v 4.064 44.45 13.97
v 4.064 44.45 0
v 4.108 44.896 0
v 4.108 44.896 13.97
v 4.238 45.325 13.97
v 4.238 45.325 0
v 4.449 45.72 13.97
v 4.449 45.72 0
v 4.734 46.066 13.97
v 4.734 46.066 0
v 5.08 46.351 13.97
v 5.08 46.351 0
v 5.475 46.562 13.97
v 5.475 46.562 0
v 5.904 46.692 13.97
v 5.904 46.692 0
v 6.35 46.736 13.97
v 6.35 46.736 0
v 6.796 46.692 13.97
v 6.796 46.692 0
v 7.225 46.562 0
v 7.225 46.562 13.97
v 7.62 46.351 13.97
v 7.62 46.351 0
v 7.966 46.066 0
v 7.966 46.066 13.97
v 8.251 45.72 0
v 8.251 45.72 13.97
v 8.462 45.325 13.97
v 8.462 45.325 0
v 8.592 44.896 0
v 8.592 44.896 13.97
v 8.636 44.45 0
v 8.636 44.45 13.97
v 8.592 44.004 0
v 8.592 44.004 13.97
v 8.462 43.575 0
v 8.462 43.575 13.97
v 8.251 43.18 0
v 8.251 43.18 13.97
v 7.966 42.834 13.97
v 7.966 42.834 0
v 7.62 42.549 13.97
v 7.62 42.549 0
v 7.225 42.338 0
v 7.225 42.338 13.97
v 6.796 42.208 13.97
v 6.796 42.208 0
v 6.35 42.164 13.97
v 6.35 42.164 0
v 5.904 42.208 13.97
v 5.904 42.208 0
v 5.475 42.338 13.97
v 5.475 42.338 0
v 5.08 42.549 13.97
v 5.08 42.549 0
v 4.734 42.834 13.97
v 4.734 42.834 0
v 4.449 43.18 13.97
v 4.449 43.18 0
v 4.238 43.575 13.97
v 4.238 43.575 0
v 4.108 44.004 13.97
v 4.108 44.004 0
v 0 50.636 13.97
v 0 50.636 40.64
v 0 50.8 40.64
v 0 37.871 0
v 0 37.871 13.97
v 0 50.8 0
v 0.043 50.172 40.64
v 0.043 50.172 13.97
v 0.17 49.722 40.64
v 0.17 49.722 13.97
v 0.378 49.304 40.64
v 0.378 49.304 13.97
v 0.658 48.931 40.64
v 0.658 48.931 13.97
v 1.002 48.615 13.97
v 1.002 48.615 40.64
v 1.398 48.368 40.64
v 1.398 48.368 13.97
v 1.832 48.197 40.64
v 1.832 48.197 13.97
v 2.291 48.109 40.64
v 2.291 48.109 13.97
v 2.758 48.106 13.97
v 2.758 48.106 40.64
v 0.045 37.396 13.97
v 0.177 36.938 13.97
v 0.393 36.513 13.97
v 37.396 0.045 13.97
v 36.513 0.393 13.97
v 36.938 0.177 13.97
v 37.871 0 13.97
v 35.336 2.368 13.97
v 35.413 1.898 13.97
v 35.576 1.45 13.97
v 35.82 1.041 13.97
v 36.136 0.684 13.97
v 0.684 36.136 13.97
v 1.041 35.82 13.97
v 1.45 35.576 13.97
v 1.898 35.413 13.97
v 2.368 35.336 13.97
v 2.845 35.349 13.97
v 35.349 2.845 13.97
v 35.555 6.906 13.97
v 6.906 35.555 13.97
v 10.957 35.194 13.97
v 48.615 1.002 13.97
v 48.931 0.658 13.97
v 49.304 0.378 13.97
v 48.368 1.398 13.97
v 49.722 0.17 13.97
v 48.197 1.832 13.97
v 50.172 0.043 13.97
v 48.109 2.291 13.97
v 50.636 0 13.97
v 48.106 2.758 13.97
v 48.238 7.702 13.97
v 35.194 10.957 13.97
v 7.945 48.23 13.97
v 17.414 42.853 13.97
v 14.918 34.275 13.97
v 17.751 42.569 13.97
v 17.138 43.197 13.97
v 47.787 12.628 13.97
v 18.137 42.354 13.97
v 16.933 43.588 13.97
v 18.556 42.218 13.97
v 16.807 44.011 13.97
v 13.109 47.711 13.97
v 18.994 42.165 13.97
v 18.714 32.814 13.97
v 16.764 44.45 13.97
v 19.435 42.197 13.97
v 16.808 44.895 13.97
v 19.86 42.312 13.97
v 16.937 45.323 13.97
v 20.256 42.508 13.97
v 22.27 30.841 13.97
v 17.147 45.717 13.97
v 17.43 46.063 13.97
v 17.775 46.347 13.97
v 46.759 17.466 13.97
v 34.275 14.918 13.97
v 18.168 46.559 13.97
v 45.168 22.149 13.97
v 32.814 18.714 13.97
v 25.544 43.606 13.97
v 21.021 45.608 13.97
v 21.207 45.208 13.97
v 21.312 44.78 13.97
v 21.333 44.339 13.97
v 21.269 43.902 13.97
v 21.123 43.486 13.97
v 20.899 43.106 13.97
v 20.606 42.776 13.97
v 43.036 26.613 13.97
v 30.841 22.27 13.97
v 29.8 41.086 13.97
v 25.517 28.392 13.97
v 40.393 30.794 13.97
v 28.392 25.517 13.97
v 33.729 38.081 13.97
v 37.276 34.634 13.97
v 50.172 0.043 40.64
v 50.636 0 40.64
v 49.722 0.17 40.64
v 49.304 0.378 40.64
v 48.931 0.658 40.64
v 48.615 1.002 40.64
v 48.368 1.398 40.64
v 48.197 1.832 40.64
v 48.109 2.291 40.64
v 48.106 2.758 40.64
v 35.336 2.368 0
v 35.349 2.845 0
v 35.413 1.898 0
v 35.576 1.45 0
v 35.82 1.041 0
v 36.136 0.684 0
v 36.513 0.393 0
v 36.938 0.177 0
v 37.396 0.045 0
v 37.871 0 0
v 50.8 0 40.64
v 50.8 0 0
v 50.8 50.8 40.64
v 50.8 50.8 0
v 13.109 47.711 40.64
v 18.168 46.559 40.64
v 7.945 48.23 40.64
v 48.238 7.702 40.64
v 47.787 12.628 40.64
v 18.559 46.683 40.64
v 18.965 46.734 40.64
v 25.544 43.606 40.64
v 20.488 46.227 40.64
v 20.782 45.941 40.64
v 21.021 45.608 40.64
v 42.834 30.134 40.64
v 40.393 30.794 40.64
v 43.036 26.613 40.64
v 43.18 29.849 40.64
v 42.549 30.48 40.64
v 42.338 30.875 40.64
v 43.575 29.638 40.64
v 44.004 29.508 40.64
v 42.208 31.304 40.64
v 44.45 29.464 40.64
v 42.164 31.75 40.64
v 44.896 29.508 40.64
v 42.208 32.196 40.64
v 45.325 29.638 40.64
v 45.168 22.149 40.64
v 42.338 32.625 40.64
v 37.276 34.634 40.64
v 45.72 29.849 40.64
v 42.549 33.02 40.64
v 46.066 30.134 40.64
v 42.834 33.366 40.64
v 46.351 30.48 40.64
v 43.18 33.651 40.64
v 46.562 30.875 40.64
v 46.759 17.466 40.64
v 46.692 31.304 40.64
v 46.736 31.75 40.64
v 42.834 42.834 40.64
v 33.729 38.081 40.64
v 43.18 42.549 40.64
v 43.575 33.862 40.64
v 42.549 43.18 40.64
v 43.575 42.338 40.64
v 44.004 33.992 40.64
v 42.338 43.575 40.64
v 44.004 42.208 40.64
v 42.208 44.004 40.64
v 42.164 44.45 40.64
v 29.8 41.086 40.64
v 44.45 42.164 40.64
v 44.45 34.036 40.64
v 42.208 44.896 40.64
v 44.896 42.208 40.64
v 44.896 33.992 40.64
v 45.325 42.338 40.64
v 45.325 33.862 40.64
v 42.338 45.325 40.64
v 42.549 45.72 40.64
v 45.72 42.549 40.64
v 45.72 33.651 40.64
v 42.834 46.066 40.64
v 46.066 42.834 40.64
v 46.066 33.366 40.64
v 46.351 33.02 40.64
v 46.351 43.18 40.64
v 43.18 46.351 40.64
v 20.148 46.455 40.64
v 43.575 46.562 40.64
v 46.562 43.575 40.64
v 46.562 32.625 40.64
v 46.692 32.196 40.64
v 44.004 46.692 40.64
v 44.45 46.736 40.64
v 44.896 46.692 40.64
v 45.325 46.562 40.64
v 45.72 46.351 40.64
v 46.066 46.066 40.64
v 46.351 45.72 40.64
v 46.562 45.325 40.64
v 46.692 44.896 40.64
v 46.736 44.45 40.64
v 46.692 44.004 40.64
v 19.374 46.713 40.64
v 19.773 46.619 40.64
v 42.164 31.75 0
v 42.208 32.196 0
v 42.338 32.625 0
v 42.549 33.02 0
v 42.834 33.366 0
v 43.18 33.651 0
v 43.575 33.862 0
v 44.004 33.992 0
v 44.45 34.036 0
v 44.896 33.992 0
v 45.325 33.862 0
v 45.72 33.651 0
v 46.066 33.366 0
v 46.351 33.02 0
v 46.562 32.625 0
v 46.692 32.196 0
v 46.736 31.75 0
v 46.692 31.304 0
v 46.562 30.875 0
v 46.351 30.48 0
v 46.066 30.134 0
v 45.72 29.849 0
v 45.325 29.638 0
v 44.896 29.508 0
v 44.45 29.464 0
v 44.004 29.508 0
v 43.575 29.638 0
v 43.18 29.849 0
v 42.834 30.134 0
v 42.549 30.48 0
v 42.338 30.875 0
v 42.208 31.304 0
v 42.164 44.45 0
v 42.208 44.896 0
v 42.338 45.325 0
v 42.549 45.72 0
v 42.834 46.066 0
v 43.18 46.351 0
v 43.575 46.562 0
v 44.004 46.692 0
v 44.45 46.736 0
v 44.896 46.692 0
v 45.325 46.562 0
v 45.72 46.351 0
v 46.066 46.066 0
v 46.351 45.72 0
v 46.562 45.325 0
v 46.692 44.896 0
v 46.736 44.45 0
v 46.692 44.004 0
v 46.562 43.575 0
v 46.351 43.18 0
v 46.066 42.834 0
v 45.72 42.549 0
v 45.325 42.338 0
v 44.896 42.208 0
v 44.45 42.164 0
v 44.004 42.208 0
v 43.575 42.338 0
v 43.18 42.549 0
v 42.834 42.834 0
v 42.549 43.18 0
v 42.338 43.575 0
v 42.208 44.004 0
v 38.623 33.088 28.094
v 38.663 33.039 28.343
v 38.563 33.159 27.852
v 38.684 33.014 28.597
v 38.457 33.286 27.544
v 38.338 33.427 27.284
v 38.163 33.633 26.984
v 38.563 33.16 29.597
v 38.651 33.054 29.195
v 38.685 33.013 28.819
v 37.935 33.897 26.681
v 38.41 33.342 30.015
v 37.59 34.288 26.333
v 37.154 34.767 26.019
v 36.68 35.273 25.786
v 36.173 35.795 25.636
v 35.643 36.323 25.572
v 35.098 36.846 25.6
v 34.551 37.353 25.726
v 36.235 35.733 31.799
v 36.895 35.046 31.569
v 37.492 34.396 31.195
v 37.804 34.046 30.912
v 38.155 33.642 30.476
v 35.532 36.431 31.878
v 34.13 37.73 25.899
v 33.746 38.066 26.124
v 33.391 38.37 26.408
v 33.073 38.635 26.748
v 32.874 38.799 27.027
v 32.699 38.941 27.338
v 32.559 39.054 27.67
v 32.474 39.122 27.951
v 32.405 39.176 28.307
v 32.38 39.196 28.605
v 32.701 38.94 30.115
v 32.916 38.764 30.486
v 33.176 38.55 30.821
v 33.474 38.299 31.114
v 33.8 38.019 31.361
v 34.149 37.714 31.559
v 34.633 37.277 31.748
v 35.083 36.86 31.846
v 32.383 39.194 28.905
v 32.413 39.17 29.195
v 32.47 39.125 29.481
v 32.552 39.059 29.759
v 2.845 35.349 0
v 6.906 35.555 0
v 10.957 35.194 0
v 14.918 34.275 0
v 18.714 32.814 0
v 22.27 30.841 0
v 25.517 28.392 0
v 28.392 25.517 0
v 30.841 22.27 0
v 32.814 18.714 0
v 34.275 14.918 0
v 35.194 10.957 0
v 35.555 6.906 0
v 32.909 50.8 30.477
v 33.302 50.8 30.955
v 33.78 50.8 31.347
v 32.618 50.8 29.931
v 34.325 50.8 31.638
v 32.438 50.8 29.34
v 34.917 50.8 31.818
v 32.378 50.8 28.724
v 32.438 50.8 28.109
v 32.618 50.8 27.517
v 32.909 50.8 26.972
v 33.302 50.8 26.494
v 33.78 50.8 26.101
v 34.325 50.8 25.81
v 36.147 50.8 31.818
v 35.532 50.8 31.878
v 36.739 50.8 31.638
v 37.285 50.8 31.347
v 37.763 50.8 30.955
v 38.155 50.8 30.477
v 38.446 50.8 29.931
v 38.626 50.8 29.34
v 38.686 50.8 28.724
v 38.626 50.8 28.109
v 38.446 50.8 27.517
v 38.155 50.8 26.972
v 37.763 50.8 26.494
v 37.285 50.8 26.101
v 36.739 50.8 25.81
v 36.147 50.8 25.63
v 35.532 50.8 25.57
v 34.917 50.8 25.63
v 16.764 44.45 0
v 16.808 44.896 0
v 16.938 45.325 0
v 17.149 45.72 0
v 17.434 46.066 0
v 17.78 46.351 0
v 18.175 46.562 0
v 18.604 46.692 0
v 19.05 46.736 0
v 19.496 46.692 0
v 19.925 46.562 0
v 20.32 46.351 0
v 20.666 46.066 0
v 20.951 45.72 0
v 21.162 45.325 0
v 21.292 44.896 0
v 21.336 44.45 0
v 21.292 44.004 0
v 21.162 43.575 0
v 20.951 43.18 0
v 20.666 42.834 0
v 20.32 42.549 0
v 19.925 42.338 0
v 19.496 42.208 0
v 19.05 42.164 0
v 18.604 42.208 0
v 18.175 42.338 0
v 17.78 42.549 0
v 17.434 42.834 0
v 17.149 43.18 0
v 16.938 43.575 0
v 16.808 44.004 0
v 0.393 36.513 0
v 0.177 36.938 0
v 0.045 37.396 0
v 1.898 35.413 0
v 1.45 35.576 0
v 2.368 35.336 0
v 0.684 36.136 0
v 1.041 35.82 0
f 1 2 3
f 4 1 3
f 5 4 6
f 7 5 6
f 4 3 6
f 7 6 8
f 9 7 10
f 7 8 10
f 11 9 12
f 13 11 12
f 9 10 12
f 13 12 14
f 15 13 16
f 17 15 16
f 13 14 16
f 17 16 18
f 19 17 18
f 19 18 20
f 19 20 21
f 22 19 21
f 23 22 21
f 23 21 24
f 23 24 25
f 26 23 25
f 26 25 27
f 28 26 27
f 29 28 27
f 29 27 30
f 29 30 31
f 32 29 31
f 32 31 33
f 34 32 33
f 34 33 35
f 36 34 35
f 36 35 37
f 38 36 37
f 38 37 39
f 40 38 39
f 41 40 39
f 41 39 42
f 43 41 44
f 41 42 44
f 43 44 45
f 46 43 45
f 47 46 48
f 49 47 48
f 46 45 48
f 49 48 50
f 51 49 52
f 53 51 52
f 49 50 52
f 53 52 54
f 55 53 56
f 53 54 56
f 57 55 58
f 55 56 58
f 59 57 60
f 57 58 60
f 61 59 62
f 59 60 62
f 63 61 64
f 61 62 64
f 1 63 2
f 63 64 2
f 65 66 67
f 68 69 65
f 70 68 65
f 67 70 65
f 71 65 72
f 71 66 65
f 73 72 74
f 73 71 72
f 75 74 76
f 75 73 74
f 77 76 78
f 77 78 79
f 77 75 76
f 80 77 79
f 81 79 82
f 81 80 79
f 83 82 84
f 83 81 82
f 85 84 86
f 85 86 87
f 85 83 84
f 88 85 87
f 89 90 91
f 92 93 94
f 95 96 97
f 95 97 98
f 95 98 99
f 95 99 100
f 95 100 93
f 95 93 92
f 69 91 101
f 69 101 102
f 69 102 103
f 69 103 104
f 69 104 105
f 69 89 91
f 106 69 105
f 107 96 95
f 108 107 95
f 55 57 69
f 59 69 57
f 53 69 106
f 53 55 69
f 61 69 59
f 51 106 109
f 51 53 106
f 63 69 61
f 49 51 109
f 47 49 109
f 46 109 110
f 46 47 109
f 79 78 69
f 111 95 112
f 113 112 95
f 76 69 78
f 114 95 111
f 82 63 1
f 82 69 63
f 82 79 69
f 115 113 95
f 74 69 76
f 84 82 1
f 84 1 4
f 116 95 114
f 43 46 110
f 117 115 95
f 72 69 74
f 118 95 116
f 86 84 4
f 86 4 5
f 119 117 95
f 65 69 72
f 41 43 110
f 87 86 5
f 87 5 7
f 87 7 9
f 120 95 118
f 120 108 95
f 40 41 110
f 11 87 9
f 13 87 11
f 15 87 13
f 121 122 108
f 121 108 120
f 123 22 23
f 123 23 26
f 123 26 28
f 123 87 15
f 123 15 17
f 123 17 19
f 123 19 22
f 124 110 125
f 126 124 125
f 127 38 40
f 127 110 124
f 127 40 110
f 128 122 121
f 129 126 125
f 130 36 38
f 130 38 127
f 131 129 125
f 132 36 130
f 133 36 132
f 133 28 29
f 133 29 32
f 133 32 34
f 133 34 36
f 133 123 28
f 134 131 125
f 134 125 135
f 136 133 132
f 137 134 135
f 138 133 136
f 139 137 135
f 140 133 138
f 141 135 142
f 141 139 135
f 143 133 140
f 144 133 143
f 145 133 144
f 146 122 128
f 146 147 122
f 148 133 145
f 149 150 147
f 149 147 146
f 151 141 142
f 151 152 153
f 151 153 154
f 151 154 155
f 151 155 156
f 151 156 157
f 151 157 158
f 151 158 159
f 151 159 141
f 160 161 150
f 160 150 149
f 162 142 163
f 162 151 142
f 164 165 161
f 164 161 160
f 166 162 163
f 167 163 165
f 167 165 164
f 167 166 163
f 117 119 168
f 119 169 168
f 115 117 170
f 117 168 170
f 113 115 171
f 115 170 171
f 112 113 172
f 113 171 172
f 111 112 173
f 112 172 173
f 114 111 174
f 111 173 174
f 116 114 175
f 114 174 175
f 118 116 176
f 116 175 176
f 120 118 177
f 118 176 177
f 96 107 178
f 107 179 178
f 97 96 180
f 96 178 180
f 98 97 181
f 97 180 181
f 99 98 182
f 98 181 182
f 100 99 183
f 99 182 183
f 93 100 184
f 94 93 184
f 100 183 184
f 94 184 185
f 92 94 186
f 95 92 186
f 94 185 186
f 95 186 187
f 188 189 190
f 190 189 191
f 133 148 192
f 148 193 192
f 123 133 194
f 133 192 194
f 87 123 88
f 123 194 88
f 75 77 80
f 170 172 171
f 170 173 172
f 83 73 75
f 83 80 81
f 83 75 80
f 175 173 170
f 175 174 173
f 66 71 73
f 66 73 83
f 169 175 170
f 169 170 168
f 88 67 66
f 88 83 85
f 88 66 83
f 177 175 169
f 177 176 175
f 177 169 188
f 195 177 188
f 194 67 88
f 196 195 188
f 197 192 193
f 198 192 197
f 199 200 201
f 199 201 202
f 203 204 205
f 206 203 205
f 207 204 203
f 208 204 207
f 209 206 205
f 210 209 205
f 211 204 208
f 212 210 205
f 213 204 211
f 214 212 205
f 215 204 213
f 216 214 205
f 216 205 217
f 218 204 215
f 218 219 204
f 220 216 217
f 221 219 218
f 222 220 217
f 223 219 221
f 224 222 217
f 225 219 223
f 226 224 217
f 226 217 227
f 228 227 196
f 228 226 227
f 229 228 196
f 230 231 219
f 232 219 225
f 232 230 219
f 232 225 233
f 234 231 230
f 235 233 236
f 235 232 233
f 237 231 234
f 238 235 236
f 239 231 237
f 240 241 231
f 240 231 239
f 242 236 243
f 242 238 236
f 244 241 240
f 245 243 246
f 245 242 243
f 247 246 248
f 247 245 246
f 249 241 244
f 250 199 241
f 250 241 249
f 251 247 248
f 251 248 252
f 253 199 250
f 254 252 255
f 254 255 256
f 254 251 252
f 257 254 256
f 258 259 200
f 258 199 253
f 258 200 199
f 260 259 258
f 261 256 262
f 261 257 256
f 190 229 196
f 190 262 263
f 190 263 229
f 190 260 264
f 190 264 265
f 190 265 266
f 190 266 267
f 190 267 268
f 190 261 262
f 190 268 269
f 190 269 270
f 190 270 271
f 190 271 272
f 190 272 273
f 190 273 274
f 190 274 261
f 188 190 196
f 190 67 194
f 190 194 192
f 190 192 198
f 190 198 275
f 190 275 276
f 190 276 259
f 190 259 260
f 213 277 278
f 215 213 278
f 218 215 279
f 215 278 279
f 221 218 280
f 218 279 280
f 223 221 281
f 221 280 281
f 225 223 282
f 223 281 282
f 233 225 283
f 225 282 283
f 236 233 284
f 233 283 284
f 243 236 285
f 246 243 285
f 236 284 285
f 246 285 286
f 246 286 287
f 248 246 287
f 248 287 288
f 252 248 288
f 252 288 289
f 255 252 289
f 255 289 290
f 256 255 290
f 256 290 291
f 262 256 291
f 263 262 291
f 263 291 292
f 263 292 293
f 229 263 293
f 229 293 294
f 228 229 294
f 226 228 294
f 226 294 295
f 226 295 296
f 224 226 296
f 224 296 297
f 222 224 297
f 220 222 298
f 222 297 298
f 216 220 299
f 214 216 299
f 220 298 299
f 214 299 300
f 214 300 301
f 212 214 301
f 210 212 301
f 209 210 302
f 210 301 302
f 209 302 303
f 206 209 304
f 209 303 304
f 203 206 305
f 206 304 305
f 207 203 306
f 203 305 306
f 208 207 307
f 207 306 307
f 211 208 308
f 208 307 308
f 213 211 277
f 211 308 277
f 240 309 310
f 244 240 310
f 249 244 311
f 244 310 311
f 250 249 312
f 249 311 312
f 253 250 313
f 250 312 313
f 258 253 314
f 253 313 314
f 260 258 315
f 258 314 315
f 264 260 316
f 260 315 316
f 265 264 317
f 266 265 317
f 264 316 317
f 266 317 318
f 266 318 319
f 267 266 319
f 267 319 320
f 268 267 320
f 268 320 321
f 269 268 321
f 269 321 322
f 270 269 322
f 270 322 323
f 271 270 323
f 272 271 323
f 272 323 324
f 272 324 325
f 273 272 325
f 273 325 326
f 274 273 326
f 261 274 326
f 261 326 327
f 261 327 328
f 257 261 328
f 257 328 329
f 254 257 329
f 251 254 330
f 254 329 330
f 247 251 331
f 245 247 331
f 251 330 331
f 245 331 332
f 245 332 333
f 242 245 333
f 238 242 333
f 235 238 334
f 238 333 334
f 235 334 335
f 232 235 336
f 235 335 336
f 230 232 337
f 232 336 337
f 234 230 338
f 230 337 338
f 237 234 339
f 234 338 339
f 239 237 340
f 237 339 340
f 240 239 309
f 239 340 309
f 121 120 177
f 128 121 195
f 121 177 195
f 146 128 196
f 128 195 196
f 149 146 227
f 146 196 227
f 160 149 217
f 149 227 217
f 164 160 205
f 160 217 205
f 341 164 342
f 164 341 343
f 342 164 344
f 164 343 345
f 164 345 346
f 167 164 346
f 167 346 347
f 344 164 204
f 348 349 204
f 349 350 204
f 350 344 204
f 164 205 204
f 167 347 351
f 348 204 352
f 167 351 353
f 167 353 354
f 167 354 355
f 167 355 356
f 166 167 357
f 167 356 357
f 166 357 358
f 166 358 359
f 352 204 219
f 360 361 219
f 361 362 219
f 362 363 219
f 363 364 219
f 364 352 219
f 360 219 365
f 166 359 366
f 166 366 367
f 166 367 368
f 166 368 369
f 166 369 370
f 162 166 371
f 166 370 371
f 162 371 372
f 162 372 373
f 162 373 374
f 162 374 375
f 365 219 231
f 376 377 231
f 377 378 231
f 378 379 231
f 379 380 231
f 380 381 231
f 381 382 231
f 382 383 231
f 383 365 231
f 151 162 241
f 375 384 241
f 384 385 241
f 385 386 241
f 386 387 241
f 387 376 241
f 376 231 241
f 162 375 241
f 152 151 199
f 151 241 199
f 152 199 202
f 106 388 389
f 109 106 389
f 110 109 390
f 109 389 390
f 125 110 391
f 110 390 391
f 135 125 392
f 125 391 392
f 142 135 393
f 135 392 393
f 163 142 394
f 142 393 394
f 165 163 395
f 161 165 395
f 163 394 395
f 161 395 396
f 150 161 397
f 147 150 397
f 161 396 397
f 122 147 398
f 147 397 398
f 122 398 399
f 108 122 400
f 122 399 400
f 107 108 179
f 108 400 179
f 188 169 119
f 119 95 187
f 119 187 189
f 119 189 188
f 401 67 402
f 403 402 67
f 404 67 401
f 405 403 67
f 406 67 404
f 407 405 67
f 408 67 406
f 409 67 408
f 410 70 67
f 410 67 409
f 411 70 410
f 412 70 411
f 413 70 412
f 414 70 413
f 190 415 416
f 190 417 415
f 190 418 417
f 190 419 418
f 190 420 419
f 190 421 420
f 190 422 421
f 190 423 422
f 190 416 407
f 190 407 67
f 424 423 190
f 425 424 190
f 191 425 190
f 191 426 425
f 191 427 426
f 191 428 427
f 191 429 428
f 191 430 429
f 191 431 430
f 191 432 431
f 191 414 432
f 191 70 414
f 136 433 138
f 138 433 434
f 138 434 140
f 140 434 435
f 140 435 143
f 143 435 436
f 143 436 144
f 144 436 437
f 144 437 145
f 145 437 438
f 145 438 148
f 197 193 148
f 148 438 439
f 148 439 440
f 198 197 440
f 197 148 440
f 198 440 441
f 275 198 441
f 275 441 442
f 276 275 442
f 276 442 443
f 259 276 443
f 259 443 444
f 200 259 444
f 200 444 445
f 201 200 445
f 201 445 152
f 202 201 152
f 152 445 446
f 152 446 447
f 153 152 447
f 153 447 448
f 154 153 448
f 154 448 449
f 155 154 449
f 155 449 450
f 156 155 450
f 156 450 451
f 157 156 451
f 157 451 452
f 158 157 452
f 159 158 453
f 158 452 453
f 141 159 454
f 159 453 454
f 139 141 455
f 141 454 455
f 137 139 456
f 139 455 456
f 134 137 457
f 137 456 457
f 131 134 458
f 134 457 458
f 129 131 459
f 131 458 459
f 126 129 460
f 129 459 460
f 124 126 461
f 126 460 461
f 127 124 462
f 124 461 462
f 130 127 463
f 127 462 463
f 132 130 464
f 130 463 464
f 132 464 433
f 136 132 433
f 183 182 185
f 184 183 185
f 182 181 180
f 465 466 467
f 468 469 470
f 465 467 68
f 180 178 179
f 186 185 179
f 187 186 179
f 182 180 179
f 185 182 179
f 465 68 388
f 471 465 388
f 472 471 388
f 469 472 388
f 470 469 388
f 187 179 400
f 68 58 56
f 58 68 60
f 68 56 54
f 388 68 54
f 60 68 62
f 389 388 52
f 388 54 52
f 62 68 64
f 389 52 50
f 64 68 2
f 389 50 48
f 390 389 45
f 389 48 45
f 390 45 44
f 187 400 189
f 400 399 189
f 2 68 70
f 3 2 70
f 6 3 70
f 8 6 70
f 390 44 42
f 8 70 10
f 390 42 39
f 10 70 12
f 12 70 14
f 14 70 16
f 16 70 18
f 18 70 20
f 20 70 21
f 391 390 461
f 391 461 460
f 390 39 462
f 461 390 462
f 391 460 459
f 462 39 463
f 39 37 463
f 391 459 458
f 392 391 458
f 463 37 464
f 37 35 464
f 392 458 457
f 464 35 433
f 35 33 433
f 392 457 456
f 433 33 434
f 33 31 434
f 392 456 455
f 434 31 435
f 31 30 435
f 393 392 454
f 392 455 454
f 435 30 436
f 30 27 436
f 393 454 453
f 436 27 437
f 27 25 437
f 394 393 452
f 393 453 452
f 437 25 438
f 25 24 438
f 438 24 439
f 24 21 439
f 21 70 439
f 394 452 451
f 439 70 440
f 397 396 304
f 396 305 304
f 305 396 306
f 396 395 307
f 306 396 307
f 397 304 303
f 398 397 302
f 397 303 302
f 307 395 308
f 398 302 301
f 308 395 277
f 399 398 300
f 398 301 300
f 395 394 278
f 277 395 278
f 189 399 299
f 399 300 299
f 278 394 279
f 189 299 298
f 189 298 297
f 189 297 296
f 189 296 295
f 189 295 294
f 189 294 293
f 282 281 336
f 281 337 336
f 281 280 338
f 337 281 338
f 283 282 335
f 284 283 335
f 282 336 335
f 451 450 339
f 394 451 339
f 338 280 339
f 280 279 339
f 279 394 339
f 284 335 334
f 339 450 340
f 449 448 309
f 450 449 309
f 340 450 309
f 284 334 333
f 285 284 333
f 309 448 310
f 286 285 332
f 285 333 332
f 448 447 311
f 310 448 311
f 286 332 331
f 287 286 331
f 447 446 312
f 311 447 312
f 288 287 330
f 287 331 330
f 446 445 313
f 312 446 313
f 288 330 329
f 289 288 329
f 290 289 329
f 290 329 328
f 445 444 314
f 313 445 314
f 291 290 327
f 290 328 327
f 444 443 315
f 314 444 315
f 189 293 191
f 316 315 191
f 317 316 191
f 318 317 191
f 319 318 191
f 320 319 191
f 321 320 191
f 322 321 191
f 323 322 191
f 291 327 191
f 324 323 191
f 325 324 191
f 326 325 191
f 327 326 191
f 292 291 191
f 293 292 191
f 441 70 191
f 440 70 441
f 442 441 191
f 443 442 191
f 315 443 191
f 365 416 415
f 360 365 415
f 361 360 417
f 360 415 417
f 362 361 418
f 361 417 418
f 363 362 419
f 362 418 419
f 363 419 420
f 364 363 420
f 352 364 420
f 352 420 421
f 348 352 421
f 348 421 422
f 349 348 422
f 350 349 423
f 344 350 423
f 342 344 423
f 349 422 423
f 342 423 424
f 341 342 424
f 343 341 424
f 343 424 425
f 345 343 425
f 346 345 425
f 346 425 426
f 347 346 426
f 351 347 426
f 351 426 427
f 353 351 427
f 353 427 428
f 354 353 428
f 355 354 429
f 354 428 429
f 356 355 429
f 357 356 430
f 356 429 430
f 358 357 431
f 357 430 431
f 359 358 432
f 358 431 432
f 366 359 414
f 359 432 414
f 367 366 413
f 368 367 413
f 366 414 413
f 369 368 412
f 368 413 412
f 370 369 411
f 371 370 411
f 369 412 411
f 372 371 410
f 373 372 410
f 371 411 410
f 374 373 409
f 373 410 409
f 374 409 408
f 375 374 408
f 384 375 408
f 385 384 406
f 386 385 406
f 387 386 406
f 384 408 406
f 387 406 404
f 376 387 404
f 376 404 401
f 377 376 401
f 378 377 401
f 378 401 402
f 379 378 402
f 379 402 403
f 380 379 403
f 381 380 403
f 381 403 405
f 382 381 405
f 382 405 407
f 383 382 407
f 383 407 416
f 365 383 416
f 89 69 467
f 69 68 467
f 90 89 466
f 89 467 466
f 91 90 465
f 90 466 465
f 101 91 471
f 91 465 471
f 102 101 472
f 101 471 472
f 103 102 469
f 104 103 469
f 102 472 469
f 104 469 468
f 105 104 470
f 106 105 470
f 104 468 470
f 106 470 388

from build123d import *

# Parameters (mm, degrees)
SKETCH1_W           = 50.8
SKETCH1_H           = 50.8
BOSS_EXTRUDE1_DEPTH = 40.64
SKETCH2_R           = 41.91
CUT_EXTRUDE1_DEPTH  = 26.67
SKETCH3_R           = 29.21
CUT_EXTRUDE2_DEPTH  = 83.540230191
SKETCH4_R           = 2.286
CUT_EXTRUDE3_DEPTH  = 83.540230191
FILLET1_R           = 2.54
SKETCH5_R           = 3.154327094
CUT_EXTRUDE4_DEPTH  = 83.540230191


with BuildPart() as part:
    # Sketch1 → Boss-Extrude1 (new body)
    with BuildSketch(Plane.XY):
        with Locations((25.4, 25.4)):
            Rectangle(SKETCH1_W, SKETCH1_H)
    extrude(amount=BOSS_EXTRUDE1_DEPTH)

    # Sketch2 → Cut-Extrude1 (cut)
    with BuildSketch(Plane.XY.offset(40.64)):
        with Locations((6.35, 6.35)):
            Circle(SKETCH2_R)
    extrude(amount=-CUT_EXTRUDE1_DEPTH, mode=Mode.SUBTRACT)

    # Sketch3 → Cut-Extrude2 (cut, through all)
    with BuildSketch(Plane(origin=(0, 0, 0), x_dir=(-1, 0, 0), z_dir=(0, 0, -1))):
        with Locations((-6.35, 6.35)):
            Circle(SKETCH3_R)
    extrude(amount=-CUT_EXTRUDE2_DEPTH, mode=Mode.SUBTRACT)

    # Sketch4 → Cut-Extrude3 (cut, through all)
    with BuildSketch(Plane(origin=(0, 0, 0), x_dir=(-1, 0, 0), z_dir=(0, 0, -1))):
        with Locations((-6.35, 44.45)):
            Circle(SKETCH4_R)
        with Locations((-19.05, 44.45)):
            Circle(SKETCH4_R)
        with Locations((-44.45, 44.45)):
            Circle(SKETCH4_R)
        with Locations((-44.45, 31.75)):
            Circle(SKETCH4_R)
    extrude(amount=-CUT_EXTRUDE3_DEPTH, mode=Mode.SUBTRACT)

    # Fillet1
    fillet1_edges = [part.edges().sort_by_distance(p)[0] for p in [
        (0, 47.776146333, 27.305),
        (47.776146333, 0, 27.305),
        (0, 34.861429287, 6.985),
        (34.861429287, 0, 6.985),
    ]]
    fillet(fillet1_edges, radius=FILLET1_R)

    # Sketch5 → Cut-Extrude4 (cut, through all)
    with BuildSketch(Plane(origin=(0, 50.8, 0), x_dir=(1, 0, 0), z_dir=(0, 1, 0))):
        with Locations(Location((35.532091271, -28.724129848, 0), (0, 0, 270))):
            Circle(SKETCH5_R)
    extrude(amount=-CUT_EXTRUDE4_DEPTH, mode=Mode.SUBTRACT)


solid = part.part
